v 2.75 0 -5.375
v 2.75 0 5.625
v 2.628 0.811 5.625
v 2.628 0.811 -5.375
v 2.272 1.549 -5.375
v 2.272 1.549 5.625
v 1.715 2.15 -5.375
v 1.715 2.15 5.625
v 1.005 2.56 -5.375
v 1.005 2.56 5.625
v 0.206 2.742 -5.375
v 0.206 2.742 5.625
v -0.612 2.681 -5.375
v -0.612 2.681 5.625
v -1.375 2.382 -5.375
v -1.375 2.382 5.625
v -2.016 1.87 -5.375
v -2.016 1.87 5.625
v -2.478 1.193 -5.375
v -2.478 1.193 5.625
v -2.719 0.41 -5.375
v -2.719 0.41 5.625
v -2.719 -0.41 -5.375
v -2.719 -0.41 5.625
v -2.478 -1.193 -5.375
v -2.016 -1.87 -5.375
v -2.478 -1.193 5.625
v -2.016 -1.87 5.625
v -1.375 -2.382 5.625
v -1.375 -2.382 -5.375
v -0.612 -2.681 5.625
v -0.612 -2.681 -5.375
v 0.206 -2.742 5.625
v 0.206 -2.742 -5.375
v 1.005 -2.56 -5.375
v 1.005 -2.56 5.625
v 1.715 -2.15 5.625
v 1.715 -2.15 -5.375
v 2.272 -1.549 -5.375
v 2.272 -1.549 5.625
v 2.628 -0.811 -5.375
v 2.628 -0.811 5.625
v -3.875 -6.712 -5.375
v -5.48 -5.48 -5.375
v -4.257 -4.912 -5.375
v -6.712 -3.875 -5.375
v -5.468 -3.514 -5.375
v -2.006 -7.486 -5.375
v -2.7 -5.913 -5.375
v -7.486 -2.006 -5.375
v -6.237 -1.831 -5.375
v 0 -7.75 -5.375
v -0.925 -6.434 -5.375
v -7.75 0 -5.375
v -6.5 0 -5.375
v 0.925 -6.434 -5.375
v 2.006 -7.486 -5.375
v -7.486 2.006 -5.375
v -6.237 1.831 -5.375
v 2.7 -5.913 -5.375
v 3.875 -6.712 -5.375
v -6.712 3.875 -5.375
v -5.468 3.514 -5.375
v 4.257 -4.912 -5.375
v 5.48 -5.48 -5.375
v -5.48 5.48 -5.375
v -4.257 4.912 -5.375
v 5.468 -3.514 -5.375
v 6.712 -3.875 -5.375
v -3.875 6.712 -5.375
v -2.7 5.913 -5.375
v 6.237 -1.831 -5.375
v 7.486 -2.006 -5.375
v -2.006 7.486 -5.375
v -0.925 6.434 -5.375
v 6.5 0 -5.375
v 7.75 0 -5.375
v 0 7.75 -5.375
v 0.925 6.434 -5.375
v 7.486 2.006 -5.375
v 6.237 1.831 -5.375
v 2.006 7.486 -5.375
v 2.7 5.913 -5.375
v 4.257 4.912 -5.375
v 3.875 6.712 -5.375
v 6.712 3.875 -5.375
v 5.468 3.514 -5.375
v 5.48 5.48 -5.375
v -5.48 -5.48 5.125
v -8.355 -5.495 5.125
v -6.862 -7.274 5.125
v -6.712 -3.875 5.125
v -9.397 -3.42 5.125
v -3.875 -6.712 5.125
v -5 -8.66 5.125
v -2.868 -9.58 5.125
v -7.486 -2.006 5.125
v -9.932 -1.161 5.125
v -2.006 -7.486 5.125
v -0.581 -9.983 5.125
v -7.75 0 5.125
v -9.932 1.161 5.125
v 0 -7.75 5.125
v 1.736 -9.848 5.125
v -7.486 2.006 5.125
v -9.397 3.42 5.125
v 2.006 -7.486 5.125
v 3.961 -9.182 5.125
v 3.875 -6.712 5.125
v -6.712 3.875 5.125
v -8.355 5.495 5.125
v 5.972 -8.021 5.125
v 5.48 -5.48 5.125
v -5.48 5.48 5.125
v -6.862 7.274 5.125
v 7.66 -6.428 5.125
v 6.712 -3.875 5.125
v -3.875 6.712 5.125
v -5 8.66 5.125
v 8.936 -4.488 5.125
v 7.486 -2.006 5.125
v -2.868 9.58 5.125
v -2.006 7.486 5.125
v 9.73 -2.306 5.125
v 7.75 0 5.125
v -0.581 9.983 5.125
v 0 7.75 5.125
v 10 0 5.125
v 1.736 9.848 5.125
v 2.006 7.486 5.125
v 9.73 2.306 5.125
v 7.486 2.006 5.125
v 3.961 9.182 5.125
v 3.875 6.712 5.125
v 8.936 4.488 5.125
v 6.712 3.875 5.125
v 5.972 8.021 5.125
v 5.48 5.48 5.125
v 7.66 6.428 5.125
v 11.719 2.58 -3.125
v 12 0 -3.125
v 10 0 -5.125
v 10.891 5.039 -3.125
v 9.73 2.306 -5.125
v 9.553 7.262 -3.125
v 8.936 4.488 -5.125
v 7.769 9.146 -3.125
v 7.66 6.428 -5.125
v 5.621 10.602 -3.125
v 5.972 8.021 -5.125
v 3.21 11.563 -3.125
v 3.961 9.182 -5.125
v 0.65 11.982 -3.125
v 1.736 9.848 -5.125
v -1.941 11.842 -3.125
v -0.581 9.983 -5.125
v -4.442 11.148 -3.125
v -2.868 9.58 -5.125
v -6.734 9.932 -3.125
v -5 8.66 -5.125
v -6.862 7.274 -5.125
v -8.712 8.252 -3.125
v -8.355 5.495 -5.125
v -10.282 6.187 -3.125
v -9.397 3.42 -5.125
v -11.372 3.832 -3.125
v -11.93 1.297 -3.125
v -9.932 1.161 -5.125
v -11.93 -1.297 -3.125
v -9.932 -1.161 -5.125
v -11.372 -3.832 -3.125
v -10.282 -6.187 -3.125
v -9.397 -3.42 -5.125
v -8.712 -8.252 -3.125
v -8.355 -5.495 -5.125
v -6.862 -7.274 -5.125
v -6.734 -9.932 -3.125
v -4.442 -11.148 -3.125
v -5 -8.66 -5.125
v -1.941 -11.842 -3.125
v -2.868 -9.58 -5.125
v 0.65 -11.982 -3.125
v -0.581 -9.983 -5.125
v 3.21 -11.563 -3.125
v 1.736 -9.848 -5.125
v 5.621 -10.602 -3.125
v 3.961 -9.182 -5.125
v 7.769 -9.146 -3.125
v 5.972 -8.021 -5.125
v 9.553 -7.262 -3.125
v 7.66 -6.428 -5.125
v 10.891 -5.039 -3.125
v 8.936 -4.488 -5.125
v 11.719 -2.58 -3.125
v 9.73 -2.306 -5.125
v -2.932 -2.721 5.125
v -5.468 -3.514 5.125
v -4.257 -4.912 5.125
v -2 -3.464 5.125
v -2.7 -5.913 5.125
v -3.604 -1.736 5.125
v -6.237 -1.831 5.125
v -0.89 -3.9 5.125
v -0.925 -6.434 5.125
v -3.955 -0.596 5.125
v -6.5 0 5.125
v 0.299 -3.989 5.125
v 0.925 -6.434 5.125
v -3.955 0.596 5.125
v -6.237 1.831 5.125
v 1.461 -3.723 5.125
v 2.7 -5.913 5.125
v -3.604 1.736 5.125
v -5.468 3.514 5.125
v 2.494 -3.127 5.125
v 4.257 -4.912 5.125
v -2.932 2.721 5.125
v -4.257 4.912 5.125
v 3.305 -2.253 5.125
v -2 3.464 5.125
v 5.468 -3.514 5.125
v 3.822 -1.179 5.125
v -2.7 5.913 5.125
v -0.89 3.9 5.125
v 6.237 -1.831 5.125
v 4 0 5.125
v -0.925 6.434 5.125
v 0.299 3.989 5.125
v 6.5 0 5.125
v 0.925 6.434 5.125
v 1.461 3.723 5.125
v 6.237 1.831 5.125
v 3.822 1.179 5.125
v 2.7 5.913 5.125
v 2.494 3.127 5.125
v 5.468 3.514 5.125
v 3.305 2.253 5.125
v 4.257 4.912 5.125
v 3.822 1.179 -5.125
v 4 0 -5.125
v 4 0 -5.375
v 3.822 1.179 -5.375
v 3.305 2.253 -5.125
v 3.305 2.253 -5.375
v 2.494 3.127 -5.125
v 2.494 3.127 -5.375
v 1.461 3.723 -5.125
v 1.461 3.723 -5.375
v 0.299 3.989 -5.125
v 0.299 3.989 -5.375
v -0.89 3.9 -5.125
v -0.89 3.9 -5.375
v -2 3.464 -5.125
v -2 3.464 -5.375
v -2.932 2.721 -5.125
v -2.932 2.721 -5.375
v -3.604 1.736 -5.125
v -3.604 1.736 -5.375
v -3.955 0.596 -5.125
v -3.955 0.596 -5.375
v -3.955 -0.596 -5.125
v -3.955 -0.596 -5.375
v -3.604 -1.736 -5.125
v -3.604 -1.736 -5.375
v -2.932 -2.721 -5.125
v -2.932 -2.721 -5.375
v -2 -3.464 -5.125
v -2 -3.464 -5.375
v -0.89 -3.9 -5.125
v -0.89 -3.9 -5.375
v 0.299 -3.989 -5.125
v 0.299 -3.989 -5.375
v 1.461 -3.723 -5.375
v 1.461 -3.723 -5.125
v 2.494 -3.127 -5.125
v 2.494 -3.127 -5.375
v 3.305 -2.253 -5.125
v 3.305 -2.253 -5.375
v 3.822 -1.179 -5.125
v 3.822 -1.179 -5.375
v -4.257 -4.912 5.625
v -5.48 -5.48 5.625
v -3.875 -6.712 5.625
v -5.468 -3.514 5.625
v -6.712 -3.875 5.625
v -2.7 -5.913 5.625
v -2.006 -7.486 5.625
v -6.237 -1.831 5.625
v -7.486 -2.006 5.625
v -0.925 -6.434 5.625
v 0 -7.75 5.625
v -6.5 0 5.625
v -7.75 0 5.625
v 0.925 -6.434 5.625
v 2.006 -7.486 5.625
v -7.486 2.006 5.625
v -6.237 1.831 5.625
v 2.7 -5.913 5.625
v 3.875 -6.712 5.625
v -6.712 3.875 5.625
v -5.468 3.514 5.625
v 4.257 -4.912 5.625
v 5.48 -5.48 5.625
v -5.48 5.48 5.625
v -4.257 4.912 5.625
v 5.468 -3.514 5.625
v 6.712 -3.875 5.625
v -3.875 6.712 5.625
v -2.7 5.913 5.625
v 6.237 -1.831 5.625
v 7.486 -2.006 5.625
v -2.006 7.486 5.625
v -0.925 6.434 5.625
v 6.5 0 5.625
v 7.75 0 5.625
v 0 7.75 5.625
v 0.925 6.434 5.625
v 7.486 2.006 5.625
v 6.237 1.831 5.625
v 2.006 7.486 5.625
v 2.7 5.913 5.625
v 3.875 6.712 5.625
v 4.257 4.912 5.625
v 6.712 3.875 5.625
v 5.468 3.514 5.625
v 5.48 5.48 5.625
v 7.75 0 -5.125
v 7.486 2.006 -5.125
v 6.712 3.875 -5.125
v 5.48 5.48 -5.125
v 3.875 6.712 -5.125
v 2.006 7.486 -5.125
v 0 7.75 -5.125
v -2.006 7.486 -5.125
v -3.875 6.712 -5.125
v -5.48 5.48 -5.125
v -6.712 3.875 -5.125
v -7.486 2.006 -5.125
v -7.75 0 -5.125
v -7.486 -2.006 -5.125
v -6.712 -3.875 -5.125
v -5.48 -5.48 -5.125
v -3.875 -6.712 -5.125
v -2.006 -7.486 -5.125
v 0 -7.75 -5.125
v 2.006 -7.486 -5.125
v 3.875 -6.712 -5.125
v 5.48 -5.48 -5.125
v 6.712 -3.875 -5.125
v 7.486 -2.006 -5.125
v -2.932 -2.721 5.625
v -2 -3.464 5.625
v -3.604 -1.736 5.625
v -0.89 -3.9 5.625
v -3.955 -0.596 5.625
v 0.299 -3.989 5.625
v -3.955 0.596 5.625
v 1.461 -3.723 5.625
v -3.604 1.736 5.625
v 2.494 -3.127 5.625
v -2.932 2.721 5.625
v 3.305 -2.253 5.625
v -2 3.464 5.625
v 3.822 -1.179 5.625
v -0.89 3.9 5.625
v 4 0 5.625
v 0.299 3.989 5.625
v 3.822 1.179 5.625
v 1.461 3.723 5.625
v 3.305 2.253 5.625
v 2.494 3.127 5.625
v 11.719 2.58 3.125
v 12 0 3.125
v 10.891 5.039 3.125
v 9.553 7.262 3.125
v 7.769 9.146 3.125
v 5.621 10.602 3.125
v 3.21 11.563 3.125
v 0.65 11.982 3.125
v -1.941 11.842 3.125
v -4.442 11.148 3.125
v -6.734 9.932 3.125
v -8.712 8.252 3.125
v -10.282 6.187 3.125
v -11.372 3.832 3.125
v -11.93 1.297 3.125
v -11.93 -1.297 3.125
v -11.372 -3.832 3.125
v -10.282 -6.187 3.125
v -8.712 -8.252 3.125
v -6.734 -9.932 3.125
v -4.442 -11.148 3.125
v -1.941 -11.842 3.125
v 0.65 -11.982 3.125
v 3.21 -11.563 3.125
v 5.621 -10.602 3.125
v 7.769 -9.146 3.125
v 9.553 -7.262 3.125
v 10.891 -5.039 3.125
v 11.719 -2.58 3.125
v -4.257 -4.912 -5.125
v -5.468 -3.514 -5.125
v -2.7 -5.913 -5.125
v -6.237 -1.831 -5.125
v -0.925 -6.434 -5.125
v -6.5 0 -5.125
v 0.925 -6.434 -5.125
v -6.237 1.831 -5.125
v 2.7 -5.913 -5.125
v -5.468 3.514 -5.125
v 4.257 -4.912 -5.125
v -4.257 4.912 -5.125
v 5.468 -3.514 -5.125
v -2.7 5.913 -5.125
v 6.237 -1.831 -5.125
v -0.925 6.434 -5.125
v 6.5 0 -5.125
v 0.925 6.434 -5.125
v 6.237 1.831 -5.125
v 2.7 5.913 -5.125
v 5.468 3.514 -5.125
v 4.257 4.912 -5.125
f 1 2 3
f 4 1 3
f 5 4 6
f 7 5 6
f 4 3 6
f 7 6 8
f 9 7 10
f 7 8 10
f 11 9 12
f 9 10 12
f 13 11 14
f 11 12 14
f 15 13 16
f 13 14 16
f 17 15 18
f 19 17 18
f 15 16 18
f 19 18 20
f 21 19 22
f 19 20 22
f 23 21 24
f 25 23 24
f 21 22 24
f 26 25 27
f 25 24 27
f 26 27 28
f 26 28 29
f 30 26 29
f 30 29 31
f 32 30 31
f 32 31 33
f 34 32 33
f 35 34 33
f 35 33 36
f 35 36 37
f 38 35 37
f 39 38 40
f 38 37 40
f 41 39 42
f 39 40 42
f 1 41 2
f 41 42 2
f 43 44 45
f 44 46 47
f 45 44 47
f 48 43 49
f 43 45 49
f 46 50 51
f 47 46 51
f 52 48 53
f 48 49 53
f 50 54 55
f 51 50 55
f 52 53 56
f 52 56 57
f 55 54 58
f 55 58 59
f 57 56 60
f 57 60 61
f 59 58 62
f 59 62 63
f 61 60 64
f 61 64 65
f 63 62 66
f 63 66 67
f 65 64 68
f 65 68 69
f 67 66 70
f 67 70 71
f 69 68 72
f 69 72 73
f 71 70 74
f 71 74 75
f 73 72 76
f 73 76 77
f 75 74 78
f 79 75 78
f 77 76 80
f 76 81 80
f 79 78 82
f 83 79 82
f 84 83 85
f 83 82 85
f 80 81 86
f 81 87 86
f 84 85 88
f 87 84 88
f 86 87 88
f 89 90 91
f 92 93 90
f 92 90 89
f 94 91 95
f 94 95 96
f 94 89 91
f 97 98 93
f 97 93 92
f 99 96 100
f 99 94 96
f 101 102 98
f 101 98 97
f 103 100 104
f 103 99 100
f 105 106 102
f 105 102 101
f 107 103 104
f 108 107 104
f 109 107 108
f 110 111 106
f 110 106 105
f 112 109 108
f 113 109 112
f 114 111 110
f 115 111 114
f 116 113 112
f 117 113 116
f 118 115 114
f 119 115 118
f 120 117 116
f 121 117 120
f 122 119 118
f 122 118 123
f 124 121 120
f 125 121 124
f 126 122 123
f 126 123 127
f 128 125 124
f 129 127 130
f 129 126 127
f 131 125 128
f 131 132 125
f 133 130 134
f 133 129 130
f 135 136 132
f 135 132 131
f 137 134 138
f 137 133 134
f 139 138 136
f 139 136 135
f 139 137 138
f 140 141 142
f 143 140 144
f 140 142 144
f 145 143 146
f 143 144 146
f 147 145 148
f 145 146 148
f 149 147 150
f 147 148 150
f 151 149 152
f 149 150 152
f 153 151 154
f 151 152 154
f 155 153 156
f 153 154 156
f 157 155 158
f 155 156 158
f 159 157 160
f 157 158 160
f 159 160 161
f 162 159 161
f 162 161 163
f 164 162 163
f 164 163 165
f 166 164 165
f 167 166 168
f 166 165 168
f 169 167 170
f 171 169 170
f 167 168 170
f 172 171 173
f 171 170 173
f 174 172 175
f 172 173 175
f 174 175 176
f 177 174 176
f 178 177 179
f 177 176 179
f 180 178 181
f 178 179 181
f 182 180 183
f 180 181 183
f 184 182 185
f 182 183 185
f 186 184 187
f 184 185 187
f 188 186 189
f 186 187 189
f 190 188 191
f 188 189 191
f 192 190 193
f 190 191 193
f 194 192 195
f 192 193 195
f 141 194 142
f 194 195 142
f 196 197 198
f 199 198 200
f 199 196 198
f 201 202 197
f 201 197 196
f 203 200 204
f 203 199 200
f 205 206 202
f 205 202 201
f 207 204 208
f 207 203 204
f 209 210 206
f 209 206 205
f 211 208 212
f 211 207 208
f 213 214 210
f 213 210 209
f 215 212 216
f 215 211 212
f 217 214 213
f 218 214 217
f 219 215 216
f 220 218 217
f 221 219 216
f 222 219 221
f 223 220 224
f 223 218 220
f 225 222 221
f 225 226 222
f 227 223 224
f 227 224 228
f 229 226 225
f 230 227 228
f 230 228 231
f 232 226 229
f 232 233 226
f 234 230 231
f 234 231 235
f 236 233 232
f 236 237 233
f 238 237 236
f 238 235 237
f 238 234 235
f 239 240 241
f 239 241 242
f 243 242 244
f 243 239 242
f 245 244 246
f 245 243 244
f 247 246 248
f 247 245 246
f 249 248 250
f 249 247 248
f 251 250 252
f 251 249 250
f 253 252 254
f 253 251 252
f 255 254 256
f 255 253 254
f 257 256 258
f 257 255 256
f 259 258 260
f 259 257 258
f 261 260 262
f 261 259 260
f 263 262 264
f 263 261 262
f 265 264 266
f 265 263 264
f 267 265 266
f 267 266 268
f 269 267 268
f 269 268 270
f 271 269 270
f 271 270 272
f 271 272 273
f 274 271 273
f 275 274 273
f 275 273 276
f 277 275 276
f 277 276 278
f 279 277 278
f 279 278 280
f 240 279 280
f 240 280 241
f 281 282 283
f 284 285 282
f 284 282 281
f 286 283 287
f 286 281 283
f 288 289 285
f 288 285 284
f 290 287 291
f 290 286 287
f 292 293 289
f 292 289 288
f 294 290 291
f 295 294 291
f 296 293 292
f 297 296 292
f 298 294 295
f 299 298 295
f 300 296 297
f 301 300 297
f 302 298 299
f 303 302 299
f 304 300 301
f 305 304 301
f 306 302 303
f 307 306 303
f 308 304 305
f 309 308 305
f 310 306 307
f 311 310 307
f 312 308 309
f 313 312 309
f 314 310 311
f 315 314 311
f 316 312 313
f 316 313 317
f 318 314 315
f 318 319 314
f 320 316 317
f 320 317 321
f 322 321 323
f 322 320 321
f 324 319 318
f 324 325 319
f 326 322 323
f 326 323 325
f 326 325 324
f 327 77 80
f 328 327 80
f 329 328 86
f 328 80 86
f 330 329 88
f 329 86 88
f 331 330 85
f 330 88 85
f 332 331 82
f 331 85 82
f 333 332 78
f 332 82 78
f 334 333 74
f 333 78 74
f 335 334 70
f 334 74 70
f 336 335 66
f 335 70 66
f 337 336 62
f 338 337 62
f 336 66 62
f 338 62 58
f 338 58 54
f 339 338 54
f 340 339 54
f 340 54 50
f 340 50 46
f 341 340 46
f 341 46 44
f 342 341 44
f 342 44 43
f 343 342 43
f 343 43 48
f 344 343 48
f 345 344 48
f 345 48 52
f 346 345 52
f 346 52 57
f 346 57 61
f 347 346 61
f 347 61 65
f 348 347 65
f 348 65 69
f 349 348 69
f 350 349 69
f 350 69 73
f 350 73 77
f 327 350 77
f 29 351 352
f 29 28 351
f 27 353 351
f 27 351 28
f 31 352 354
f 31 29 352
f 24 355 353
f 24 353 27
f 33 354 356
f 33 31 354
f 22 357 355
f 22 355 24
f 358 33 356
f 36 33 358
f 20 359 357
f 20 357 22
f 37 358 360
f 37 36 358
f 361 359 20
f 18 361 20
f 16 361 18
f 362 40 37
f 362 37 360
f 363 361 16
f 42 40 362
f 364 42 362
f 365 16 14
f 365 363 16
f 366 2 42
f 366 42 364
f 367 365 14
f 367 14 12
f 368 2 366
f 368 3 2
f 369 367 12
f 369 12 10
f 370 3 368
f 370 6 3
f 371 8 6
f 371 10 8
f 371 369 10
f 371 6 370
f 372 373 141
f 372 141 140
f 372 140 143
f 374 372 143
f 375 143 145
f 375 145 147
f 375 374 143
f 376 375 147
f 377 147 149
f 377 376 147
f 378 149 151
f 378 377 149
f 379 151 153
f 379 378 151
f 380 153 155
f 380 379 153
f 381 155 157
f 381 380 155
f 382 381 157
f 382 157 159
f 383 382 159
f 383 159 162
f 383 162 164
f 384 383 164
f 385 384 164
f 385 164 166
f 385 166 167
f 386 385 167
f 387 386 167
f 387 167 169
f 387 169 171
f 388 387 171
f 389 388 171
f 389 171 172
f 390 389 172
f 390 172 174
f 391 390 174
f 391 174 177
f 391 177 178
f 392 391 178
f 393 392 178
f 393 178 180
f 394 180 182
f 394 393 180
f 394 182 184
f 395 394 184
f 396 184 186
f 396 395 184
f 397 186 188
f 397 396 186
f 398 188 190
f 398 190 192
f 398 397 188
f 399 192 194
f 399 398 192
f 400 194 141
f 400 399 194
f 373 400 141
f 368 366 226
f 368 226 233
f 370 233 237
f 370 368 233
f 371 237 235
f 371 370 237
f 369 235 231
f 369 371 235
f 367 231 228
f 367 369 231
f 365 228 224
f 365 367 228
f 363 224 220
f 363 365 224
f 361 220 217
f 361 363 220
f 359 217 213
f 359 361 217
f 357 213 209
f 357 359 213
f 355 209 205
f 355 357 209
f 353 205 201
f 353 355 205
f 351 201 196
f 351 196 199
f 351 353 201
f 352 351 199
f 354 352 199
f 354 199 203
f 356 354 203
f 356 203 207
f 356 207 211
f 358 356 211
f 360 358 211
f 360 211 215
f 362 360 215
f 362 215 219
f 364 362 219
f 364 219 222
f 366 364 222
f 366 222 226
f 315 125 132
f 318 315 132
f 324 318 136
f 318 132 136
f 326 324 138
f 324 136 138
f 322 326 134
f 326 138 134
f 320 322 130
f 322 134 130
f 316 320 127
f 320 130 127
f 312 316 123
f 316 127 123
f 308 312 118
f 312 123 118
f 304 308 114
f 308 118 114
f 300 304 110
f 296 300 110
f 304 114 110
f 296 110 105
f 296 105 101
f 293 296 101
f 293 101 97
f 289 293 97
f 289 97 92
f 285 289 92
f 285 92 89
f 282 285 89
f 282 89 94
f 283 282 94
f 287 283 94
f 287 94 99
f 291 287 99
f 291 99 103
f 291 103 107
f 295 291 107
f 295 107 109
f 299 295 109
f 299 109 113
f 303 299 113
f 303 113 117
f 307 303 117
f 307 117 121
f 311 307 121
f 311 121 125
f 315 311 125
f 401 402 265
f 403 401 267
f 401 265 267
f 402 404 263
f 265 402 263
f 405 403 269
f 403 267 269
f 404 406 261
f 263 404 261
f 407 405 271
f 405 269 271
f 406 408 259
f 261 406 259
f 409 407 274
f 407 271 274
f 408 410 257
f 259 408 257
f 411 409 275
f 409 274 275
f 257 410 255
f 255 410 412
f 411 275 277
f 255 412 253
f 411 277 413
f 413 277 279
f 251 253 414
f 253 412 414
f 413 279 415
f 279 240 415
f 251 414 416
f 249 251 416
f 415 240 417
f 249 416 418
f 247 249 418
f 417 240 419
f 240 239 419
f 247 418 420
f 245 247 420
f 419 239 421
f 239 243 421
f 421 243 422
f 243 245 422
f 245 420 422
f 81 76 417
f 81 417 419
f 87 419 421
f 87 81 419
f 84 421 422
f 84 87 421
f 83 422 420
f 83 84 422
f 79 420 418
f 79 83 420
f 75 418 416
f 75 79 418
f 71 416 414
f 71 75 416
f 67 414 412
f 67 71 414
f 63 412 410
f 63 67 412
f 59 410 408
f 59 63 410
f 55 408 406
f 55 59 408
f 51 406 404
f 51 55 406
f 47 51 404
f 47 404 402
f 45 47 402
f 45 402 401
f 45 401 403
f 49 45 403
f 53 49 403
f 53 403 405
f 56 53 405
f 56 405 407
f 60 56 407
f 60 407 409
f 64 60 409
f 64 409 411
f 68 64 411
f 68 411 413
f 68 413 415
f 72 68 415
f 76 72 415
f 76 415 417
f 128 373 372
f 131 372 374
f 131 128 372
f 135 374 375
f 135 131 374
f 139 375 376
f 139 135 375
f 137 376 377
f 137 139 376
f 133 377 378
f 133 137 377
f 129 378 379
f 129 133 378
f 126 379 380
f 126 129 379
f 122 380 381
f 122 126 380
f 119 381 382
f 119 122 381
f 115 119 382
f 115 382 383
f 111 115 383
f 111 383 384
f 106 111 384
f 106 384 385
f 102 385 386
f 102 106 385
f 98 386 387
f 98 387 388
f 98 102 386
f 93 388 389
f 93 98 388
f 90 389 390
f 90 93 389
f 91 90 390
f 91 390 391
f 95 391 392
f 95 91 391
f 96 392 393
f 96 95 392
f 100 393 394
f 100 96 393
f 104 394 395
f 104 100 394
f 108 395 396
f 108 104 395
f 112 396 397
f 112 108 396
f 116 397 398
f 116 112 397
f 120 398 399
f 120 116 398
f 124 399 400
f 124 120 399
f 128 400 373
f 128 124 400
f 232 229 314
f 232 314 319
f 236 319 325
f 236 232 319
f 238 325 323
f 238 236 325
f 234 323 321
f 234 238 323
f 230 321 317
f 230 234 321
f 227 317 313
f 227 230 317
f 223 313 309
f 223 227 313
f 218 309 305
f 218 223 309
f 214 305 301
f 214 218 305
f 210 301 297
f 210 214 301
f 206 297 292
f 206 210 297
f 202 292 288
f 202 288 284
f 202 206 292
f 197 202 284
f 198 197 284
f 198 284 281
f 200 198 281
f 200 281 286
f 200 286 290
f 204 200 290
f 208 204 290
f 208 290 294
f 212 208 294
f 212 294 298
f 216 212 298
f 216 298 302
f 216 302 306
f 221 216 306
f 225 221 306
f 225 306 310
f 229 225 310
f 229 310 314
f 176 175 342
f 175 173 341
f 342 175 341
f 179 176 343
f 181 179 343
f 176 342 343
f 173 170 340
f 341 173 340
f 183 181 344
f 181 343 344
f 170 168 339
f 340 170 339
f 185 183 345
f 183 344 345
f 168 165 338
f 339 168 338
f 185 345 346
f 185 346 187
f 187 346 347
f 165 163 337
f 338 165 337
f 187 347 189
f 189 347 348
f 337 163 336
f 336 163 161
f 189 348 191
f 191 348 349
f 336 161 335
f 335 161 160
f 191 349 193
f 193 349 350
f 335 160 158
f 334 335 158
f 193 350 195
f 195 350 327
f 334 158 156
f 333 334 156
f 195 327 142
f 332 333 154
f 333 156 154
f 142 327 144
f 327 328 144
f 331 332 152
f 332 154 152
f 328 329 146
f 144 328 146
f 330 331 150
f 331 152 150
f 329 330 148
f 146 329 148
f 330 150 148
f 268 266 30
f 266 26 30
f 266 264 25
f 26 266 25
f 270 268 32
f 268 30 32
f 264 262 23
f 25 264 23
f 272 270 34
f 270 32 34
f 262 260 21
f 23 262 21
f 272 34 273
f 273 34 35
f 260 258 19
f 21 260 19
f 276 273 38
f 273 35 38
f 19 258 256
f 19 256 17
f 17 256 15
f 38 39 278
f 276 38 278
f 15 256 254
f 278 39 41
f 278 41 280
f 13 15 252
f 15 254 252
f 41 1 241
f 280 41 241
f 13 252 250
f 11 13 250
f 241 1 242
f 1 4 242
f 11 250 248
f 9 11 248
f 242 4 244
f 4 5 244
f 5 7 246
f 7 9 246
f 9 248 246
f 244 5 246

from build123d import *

# Parameters (mm, degrees)
SKETCH1_R                = 12
SKETCH1_R_2              = 7.75
BOSS_EXTRUDE1_DEPTH      = 5.125
CHAMFER1_SIZE            = 2
BOSS_EXTRUDE2_DEPTH      = 0.5
BOSS_EXTRUDE2_DEPTH_BACK = 10.5
SKETCH2_R                = 7.75
SKETCH2_R_2              = 6.5
SKETCH3_R                = 6.5
SKETCH3_R_2              = 4
BOSS_EXTRUDE3_DEPTH      = 10.25
SKETCH4_R                = 4
SKETCH4_R_2              = 2.75
BOSS_EXTRUDE4_DEPTH      = 11


with BuildPart() as part:
    # Sketch1 → Boss-Extrude1 (new, symmetric)
    with BuildSketch(Plane.XY):
        Circle(SKETCH1_R)
        Circle(SKETCH1_R_2, mode=Mode.SUBTRACT)
    extrude(amount=BOSS_EXTRUDE1_DEPTH, both=True)

    # Chamfer1
    chamfer1_edges = [part.edges().sort_by_distance(p)[0] for p in [
        (-12, 0, -5.125),
        (-12, 0, 5.125),
    ]]
    chamfer(chamfer1_edges, length=CHAMFER1_SIZE)

    # Sketch2 → Boss-Extrude2 (add, two sides: drawn at the far end of the back side and taken through both)
    with BuildSketch(Plane.XY.offset(5.125).offset(-BOSS_EXTRUDE2_DEPTH_BACK)):
        Circle(SKETCH2_R)
        Circle(SKETCH2_R_2, mode=Mode.SUBTRACT)
    extrude(amount=BOSS_EXTRUDE2_DEPTH + BOSS_EXTRUDE2_DEPTH_BACK)

    # Sketch3 → Boss-Extrude3 (add)
    with BuildSketch(Plane.XY.offset(5.125)):
        Circle(SKETCH3_R)
        Circle(SKETCH3_R_2, mode=Mode.SUBTRACT)
    extrude(amount=-BOSS_EXTRUDE3_DEPTH)

    # Sketch4 → Boss-Extrude4 (add)
    with BuildSketch(Plane.XY.offset(5.625)):
        Circle(SKETCH4_R)
        Circle(SKETCH4_R_2, mode=Mode.SUBTRACT)
    extrude(amount=-BOSS_EXTRUDE4_DEPTH)


solid = part.part
